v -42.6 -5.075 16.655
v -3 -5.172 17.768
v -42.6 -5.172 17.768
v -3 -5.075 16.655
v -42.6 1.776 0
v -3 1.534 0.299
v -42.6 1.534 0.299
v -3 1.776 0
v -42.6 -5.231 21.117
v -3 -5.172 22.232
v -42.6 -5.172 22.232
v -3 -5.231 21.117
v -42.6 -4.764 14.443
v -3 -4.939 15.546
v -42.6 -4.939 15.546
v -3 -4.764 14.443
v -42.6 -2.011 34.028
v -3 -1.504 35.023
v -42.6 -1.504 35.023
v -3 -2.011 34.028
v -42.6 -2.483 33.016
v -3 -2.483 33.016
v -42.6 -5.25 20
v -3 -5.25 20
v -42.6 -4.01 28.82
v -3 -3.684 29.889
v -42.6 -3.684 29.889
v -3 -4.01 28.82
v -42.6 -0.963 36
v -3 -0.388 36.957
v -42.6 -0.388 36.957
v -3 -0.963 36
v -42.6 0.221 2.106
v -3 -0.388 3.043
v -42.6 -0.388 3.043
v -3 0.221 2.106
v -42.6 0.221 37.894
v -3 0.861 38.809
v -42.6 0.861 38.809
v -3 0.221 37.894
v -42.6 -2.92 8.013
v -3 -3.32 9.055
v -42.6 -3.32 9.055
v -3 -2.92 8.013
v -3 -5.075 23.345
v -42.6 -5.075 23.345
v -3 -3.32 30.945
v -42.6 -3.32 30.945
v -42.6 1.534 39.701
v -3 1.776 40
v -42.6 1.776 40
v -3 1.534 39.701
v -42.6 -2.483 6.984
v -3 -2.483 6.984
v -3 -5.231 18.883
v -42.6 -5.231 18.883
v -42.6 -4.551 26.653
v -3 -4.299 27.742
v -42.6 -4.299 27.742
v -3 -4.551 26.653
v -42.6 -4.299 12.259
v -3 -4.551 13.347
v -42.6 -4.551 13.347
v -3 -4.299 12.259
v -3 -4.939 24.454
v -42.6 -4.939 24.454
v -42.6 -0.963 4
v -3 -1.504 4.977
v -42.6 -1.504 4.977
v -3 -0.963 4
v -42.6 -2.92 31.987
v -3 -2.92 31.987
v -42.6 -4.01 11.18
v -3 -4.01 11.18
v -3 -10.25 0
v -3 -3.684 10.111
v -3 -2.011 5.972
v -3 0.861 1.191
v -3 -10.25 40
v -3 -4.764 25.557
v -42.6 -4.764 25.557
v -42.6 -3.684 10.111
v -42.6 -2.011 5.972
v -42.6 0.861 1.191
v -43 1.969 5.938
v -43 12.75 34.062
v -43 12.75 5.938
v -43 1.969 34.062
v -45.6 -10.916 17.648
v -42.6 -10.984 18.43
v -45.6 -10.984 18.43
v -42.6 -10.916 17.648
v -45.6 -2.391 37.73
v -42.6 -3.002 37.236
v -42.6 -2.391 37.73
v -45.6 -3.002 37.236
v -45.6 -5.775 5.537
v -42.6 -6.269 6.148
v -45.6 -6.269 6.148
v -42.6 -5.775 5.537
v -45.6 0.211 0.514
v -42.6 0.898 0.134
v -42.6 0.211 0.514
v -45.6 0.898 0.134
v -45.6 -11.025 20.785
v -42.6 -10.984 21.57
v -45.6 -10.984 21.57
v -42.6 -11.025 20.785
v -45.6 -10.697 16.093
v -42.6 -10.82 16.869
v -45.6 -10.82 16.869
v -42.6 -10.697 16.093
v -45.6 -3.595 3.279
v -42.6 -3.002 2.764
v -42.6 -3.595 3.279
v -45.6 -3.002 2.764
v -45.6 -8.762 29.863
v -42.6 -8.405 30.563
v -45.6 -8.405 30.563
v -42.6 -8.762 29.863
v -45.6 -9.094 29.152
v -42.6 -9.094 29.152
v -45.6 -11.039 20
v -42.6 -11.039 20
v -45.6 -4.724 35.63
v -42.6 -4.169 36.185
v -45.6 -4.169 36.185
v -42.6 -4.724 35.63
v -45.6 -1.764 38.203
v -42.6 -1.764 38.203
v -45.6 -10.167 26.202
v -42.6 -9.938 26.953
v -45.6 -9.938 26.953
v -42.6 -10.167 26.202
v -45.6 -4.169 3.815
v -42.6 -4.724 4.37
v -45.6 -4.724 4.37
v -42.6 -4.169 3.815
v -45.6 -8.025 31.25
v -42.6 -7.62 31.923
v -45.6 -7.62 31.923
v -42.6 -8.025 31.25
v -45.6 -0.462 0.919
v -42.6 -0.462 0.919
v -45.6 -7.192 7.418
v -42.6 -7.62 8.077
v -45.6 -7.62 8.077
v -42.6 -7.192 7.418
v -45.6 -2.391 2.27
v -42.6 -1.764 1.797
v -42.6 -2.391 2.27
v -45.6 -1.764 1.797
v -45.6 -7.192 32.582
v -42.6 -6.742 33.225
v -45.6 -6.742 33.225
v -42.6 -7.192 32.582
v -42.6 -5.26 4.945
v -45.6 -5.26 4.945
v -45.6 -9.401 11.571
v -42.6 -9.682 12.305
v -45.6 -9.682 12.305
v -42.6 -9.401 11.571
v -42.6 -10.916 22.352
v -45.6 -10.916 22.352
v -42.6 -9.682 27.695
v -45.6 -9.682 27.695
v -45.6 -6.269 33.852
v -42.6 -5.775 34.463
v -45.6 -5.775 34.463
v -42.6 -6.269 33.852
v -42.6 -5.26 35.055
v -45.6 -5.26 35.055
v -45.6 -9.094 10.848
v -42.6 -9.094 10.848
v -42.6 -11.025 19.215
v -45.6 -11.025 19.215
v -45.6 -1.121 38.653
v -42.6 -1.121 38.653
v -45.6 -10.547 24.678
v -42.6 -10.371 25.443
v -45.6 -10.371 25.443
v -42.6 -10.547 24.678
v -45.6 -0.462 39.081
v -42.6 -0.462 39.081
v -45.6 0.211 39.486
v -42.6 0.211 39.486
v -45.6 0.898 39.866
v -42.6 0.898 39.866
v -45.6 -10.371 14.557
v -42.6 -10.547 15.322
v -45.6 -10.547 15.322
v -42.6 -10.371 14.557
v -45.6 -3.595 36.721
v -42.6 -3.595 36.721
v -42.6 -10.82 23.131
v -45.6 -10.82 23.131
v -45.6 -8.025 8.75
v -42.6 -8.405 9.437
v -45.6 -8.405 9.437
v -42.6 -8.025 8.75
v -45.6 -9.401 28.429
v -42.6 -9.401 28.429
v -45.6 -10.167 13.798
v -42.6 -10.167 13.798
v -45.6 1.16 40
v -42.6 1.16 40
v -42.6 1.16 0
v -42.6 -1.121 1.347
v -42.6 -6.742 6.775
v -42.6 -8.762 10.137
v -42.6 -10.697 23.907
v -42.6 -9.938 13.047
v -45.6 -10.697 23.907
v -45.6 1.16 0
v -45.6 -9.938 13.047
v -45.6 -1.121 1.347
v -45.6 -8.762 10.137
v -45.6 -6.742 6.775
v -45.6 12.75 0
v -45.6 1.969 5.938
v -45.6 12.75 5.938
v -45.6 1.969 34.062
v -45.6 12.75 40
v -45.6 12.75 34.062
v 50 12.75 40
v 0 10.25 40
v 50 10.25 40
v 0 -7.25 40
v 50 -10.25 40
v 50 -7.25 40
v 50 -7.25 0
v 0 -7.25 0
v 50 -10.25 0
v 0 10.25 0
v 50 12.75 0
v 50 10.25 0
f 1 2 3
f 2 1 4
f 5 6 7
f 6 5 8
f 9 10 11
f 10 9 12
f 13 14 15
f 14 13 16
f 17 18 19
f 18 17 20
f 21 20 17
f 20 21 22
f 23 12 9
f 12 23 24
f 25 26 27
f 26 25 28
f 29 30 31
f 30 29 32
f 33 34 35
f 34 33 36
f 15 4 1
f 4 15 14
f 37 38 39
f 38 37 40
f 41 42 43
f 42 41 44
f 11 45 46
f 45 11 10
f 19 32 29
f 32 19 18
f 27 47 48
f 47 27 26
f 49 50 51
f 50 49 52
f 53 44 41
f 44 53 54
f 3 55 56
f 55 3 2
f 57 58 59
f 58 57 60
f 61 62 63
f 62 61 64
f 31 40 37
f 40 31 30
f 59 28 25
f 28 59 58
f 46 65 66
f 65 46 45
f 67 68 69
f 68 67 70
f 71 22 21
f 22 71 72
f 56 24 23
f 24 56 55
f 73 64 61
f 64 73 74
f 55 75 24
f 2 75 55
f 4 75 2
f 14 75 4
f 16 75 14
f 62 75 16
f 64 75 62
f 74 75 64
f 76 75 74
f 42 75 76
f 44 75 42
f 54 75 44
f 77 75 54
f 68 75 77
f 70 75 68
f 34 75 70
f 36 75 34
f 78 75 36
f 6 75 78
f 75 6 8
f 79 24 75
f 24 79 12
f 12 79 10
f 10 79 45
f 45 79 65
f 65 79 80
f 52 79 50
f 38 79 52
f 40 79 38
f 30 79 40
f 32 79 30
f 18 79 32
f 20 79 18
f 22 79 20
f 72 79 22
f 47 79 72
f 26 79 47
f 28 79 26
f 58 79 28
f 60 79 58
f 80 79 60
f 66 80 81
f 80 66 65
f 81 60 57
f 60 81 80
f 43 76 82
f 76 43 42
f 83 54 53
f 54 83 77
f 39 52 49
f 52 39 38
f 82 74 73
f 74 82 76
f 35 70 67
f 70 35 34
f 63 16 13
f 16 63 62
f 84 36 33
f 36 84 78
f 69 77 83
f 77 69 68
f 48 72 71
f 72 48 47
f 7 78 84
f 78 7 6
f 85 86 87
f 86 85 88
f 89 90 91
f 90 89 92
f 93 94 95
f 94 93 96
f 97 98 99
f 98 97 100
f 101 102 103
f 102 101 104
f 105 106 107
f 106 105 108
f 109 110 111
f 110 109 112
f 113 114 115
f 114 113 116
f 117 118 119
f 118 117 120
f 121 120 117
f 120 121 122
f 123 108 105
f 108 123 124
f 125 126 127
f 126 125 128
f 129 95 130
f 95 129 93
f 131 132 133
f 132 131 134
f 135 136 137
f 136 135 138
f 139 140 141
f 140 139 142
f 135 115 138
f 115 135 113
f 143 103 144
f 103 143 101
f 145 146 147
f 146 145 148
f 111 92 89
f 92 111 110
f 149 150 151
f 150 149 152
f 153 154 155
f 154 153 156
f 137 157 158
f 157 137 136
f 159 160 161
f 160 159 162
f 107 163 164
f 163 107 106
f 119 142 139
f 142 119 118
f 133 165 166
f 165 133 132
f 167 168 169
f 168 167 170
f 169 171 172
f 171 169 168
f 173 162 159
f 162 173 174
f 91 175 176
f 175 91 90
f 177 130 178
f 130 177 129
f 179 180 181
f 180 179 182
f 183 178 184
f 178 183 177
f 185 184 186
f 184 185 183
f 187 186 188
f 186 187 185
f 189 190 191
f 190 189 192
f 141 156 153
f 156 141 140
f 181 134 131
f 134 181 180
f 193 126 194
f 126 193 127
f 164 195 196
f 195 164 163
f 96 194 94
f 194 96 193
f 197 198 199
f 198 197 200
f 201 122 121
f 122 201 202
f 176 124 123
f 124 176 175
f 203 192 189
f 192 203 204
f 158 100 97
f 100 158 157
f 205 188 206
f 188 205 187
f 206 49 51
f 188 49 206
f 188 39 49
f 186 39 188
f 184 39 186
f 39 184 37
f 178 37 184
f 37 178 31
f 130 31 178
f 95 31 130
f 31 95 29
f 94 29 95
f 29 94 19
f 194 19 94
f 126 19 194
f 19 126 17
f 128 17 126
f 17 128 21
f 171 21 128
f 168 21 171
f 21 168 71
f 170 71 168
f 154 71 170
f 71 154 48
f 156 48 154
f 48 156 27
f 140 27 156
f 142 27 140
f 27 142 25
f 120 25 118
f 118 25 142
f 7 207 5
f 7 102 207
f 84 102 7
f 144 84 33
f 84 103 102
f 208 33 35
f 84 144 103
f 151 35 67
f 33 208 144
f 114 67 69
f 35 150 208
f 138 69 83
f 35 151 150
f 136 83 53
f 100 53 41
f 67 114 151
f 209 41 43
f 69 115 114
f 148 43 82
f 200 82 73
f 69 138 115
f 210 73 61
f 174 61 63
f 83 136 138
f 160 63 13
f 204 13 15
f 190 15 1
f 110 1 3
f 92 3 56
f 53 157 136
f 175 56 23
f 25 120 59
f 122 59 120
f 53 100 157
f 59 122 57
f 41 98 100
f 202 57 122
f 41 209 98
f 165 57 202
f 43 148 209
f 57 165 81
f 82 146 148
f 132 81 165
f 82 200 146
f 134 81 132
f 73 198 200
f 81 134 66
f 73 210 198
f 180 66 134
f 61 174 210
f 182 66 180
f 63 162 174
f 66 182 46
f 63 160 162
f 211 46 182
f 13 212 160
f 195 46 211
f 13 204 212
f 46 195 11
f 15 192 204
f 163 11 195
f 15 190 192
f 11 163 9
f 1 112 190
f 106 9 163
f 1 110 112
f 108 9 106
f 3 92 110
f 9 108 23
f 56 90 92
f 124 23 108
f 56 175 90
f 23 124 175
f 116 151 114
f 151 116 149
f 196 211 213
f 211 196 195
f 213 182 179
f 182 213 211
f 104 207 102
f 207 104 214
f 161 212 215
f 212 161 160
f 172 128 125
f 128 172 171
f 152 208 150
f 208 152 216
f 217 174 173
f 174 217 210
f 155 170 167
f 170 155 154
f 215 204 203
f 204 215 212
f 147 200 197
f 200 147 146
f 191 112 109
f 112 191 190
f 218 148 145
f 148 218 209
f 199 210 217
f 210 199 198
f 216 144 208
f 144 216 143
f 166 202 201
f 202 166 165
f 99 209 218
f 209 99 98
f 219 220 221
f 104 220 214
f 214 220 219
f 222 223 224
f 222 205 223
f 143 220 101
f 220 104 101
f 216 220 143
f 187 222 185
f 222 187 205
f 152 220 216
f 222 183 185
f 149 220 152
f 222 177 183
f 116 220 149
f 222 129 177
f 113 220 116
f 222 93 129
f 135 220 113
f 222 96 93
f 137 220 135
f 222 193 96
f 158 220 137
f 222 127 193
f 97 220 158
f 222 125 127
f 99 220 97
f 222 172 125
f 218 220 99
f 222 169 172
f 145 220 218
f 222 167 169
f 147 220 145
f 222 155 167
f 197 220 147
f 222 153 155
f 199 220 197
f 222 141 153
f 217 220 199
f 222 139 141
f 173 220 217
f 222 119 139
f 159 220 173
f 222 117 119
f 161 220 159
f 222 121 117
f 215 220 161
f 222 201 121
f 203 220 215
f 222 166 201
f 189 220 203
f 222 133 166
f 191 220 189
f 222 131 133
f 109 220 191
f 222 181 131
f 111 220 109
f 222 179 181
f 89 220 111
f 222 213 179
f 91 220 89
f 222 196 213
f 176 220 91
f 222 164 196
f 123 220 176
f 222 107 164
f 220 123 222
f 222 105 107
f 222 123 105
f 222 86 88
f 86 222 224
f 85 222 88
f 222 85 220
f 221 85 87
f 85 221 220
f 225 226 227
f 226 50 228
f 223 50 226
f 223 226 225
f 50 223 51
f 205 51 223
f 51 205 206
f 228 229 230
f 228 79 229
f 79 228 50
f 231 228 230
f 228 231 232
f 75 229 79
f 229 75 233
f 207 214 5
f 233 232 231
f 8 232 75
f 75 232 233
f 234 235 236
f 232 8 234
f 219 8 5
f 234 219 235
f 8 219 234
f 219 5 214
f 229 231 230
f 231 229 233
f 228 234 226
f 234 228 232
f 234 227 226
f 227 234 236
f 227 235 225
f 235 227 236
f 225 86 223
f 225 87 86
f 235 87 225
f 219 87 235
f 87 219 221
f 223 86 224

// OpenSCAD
// Filename: parametric_headset_holder.scad
// Author: Steffen Pfiffner
// Date: 06/10/2014
// Email: s.pfiffner@gmail.com
// Web: http://www.thingiverse.com/FiveF

// Project: Parametric Headset Holder

//use <build_plate.scad>

/* [Basic] */
//Normally the thickness of the table should be chosen slightly bigger than the real thickness because material shrinkage. (for PLA about 0.1mm)
thickness_of_tabletop = 17.5;
width_of_headband = 40;

holder_length = 50;
holder_width = 40;
holder_strength = 3;

holder_height = 5;

/* [Quality] */
//$fa is the minimum angle for a fragment. Even a huge circle does not have more fragments than 360 divided by this number. The default value is 12 (i.e. 30 fragments for a full circle). The minimum allowed value is 0.01. Any attempt to set a lower value will cause a warning.
$fa = 2.0;

//$fs is the minimum size of a fragment. Because of this variable very small circles have a smaller number of fragments than specified using $fa. The default value is 2. The minimum allowed value is 0.01. Any attempt to set a lower value will cause a warning.
$fs = 1.0;

/* [Advanced] */

/* [Hidden] */
width_of_headset = width_of_headband + 2*holder_strength;

//Build plate:

//for display only, doesn't contribute to final object
build_plate_selector = 0; //[0:Replicator 2,1: Replicator,2:Thingomatic,3:Manual]

//when Build Plate Selector is set to "manual" this controls the build plate x dimension
build_plate_manual_x = 100; //[100:400]

//when Build Plate Selector is set to "manual" this controls the build plate y dimension
build_plate_manual_y = 100; //[100:400]

//build_plate(build_plate_selector,build_plate_manual_x,build_plate_manual_y);

//Build plate END


//half cylinder
module half_cylinder(){
	difference(){
		translate([0, -holder_length/2-width_of_headset/2, 15+thickness_of_tabletop+holder_strength]){
			rotate(a=90, v=[1,0,0]){
				
				cylinder (h = width_of_headset-2*holder_strength, r=holder_width*.8, center = true);
			}
			
		}
		
		translate([0,-holder_length/2-width_of_headset/2,holder_width/2+thickness_of_tabletop-holder_strength*2+0.5]){
			cube([holder_width,width_of_headset+5,holder_width/2], center = true);
		}
	}
}

//HOLDER START
//thickness_of_tabletop+holder_strength/2+holder_strength
translate([holder_length/2,-thickness_of_tabletop/2,holder_width/2]){
	rotate(a=180, v=[0,1,0]){
		rotate(a=90, v=[0,0,1]){
			rotate(a=90, v=[0,1,0]){
				difference(){
					union(){

						translate([0,0,0]){
							cube([holder_width,holder_length,holder_strength], center = true);
						}

						translate([0,0,thickness_of_tabletop+holder_strength]){
							cube([holder_width,holder_length,holder_strength], center = true);
						}


						translate([0,-holder_length/2-holder_strength/2,thickness_of_tabletop/2+holder_strength/2]){
							rotate(a=90, v=[1,0,0]){
								cube([holder_width,thickness_of_tabletop+2*holder_strength,holder_strength], center = true);
							}
						}


						half_cylinder();
						
						translate([0, -holder_length/2-width_of_headset+holder_strength/2+holder_strength+1, -holder_height+0.25]){
							resize([holder_width+holder_height,holder_strength,0], auto=true){
								half_cylinder();
							}
						
						}
					}

					union(){

						//the following line remove stuff
						//bottom
						translate([0,-holder_length/2-width_of_headset/2,holder_width/2+thickness_of_tabletop-holder_strength*2+50]){
							cube([holder_width*2, width_of_headset*5, holder_width/2+100], center = true);
						}

						//sides
						//left
						translate([holder_width/2 + 20,0,0]){
							cube([40,500,500], center = true);
						}

						//right
						translate([-holder_width/2 - 20,0,0]){
							cube([40,500,500], center = true);
						}

					}
				}
			}
		}
	}
}

//HOLDER END
